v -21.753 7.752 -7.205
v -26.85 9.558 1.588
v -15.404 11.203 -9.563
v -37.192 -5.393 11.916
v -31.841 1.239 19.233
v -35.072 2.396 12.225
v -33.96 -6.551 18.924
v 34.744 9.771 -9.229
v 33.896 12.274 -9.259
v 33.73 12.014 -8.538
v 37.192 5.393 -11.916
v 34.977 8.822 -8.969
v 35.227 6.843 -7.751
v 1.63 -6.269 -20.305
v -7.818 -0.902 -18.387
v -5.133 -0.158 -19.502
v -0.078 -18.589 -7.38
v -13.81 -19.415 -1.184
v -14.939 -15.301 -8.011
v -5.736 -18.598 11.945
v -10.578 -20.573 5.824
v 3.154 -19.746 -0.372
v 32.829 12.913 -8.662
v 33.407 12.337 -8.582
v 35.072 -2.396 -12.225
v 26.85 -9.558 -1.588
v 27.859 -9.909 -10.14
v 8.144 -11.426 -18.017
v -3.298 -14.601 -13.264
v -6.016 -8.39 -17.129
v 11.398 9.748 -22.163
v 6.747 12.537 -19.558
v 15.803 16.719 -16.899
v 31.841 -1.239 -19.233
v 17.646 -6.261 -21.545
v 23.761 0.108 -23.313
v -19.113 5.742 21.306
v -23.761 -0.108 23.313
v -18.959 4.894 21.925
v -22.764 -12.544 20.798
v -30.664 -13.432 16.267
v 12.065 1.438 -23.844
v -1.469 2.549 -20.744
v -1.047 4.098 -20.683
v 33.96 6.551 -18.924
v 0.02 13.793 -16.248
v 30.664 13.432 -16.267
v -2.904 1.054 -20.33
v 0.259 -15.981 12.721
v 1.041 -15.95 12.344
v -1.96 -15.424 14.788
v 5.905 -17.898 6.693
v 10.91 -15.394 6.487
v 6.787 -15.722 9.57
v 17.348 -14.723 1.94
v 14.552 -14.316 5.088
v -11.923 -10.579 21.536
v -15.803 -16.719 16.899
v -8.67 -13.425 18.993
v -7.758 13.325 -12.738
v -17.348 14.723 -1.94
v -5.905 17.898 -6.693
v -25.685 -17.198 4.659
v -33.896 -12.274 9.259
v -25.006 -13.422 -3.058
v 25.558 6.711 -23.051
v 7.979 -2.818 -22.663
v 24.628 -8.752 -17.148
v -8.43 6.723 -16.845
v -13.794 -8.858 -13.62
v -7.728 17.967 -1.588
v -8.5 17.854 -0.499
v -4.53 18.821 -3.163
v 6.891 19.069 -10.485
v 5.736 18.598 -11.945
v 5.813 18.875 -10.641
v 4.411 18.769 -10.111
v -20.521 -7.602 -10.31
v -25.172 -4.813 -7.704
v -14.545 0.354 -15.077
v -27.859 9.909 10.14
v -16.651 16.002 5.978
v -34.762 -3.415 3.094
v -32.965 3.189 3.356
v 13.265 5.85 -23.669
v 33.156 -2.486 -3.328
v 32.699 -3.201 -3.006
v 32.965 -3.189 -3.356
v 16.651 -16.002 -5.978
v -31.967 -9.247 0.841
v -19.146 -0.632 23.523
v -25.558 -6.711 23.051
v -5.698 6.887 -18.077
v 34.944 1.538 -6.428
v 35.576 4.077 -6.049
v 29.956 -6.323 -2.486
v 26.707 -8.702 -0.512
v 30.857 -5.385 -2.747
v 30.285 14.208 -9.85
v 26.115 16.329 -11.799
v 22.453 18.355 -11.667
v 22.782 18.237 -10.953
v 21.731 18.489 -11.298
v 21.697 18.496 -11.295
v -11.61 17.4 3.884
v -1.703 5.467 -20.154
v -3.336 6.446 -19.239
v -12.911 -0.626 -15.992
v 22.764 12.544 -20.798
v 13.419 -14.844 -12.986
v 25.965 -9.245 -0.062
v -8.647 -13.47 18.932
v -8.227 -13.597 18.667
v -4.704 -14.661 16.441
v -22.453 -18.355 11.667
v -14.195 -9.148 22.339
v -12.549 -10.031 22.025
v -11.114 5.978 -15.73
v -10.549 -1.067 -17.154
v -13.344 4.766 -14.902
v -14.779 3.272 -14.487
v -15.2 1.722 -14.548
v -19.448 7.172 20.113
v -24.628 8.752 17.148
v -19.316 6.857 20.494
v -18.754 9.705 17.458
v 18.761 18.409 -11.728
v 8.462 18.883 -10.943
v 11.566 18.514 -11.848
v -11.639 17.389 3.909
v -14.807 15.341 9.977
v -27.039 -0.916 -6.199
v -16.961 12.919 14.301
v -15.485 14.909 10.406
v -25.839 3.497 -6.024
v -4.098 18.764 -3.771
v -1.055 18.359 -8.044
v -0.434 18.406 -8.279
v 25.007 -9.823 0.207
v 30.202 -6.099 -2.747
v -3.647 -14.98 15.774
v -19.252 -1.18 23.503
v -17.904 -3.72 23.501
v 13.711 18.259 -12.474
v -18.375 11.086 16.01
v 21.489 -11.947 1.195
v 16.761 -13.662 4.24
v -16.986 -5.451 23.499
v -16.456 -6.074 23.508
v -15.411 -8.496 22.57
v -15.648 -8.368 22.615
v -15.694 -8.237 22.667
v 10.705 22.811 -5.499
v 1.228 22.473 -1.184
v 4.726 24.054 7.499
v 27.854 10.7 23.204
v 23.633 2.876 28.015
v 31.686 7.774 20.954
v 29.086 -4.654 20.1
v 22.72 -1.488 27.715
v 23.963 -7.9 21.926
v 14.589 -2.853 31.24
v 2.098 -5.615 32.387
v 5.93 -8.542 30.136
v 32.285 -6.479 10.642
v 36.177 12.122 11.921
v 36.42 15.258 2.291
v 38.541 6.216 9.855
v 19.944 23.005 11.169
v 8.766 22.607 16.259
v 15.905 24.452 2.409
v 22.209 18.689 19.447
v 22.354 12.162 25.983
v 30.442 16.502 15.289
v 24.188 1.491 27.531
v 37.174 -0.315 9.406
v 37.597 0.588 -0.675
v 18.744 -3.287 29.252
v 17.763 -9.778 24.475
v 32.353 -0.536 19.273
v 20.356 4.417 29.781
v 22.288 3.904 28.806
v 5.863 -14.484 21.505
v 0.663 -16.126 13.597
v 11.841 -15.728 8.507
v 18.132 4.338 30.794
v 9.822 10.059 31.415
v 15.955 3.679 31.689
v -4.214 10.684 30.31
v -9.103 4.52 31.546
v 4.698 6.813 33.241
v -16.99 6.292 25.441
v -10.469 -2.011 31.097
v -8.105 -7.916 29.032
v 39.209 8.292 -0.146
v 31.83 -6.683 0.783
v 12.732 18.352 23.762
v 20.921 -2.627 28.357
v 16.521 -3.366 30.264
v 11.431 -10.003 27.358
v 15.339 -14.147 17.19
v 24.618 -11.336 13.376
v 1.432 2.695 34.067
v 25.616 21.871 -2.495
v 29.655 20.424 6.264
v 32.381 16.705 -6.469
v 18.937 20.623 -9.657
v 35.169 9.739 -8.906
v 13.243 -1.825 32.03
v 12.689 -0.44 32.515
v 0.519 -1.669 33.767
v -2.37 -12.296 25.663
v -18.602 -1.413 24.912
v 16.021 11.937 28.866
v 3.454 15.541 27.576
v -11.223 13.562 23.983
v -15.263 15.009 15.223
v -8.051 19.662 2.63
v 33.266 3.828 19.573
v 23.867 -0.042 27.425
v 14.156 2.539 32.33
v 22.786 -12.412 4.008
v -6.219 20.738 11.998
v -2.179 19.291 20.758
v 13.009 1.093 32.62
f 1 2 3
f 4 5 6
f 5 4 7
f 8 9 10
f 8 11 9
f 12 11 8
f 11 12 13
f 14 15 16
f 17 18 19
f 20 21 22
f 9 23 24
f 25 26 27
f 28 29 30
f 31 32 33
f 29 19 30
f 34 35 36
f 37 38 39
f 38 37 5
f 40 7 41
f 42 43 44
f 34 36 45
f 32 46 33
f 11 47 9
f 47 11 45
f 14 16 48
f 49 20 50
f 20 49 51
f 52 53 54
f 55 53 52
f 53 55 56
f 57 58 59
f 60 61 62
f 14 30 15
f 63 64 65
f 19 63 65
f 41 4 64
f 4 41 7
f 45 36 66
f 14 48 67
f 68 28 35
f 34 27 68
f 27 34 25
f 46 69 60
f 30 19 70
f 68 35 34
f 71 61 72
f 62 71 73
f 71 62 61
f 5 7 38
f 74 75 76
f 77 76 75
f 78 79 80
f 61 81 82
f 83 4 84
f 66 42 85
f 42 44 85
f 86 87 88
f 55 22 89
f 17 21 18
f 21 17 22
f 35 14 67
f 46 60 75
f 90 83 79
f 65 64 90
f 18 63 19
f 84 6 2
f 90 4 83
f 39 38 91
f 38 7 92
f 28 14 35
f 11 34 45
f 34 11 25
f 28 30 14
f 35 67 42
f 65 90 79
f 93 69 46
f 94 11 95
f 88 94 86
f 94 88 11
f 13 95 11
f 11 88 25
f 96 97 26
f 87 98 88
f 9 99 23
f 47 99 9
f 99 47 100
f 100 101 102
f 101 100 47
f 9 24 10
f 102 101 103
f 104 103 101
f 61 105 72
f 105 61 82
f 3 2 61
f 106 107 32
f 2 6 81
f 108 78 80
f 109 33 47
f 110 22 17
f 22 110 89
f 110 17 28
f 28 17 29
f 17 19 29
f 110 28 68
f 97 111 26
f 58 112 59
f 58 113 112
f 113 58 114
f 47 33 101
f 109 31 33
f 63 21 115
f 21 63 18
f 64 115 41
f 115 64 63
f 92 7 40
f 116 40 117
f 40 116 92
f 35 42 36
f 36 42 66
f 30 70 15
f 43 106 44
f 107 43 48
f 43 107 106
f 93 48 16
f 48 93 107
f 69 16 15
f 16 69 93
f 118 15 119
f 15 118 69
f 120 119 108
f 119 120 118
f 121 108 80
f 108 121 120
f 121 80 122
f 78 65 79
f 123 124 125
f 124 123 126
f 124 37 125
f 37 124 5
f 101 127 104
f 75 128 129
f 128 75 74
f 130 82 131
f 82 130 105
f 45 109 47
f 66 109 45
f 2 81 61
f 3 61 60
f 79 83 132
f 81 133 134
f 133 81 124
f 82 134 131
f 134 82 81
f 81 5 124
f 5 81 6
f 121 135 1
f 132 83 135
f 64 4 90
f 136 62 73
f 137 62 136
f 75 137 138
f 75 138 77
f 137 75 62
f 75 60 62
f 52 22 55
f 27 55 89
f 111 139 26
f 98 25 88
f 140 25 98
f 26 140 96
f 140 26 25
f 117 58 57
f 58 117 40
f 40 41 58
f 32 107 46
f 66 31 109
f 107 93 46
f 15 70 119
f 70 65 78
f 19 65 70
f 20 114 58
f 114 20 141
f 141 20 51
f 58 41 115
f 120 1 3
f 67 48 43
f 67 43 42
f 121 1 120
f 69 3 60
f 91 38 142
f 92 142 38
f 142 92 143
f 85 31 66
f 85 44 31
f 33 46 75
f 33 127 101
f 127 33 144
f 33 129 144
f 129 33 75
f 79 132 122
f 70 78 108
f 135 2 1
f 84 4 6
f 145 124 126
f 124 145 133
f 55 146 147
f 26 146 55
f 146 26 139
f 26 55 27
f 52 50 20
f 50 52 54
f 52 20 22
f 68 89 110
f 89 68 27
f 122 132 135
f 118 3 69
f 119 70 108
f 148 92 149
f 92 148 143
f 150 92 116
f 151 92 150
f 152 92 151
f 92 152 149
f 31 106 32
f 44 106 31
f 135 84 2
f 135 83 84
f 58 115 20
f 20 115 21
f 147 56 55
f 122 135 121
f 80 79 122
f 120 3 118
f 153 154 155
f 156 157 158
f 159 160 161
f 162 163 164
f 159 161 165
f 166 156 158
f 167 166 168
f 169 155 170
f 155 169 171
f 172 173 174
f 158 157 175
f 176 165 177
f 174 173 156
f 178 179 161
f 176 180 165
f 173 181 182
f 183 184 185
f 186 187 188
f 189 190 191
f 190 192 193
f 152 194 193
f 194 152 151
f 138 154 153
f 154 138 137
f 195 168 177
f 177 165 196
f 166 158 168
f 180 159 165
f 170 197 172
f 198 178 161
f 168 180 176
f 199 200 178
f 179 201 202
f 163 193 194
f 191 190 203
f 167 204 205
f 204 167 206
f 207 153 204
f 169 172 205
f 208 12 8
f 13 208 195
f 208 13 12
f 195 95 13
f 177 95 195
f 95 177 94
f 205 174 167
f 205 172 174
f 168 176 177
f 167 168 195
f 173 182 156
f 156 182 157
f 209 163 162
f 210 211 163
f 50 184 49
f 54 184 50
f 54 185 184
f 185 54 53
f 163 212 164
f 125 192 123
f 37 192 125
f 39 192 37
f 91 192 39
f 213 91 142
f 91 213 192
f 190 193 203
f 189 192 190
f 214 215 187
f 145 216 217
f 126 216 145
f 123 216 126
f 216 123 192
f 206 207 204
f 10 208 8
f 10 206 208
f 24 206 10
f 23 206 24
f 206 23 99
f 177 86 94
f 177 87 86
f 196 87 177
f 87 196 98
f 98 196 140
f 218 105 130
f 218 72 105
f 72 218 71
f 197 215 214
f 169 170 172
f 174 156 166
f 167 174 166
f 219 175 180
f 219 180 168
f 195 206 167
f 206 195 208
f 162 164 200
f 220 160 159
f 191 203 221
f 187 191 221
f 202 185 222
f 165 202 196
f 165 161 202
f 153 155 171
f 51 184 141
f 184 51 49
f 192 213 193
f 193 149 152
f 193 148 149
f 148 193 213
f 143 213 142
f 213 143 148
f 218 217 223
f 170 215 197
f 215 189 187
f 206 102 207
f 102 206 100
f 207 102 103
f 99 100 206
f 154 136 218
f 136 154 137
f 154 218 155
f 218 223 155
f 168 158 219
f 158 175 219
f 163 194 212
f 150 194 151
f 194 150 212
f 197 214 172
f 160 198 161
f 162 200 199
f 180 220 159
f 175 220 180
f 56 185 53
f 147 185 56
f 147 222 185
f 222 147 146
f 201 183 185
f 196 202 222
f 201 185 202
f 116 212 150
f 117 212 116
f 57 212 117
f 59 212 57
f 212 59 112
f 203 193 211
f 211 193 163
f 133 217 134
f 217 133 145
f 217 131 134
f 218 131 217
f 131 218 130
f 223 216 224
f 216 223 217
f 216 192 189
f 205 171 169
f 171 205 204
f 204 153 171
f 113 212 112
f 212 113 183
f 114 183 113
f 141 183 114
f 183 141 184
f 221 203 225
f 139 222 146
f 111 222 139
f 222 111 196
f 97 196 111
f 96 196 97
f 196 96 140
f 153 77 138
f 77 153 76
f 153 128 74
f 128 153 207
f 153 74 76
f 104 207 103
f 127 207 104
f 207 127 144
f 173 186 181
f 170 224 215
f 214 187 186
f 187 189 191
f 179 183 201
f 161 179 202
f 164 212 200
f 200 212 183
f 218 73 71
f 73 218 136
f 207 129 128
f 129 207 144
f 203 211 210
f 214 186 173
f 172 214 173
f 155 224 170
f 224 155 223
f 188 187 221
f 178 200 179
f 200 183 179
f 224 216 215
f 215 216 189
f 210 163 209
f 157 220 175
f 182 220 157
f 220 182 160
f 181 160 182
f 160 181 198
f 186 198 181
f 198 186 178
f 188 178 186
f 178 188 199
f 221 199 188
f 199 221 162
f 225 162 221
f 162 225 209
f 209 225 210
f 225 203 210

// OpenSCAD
$fn=16;

rotate(a = 27, v = [0.3, 0.7, 0.2])
union() {
scale(v = [2, 1, 1])
	sphere(r = 20);
translate(v = [5, 5, 10])
	scale(v = [1.3, 0.8, 1])
		sphere(r = 25);
}
